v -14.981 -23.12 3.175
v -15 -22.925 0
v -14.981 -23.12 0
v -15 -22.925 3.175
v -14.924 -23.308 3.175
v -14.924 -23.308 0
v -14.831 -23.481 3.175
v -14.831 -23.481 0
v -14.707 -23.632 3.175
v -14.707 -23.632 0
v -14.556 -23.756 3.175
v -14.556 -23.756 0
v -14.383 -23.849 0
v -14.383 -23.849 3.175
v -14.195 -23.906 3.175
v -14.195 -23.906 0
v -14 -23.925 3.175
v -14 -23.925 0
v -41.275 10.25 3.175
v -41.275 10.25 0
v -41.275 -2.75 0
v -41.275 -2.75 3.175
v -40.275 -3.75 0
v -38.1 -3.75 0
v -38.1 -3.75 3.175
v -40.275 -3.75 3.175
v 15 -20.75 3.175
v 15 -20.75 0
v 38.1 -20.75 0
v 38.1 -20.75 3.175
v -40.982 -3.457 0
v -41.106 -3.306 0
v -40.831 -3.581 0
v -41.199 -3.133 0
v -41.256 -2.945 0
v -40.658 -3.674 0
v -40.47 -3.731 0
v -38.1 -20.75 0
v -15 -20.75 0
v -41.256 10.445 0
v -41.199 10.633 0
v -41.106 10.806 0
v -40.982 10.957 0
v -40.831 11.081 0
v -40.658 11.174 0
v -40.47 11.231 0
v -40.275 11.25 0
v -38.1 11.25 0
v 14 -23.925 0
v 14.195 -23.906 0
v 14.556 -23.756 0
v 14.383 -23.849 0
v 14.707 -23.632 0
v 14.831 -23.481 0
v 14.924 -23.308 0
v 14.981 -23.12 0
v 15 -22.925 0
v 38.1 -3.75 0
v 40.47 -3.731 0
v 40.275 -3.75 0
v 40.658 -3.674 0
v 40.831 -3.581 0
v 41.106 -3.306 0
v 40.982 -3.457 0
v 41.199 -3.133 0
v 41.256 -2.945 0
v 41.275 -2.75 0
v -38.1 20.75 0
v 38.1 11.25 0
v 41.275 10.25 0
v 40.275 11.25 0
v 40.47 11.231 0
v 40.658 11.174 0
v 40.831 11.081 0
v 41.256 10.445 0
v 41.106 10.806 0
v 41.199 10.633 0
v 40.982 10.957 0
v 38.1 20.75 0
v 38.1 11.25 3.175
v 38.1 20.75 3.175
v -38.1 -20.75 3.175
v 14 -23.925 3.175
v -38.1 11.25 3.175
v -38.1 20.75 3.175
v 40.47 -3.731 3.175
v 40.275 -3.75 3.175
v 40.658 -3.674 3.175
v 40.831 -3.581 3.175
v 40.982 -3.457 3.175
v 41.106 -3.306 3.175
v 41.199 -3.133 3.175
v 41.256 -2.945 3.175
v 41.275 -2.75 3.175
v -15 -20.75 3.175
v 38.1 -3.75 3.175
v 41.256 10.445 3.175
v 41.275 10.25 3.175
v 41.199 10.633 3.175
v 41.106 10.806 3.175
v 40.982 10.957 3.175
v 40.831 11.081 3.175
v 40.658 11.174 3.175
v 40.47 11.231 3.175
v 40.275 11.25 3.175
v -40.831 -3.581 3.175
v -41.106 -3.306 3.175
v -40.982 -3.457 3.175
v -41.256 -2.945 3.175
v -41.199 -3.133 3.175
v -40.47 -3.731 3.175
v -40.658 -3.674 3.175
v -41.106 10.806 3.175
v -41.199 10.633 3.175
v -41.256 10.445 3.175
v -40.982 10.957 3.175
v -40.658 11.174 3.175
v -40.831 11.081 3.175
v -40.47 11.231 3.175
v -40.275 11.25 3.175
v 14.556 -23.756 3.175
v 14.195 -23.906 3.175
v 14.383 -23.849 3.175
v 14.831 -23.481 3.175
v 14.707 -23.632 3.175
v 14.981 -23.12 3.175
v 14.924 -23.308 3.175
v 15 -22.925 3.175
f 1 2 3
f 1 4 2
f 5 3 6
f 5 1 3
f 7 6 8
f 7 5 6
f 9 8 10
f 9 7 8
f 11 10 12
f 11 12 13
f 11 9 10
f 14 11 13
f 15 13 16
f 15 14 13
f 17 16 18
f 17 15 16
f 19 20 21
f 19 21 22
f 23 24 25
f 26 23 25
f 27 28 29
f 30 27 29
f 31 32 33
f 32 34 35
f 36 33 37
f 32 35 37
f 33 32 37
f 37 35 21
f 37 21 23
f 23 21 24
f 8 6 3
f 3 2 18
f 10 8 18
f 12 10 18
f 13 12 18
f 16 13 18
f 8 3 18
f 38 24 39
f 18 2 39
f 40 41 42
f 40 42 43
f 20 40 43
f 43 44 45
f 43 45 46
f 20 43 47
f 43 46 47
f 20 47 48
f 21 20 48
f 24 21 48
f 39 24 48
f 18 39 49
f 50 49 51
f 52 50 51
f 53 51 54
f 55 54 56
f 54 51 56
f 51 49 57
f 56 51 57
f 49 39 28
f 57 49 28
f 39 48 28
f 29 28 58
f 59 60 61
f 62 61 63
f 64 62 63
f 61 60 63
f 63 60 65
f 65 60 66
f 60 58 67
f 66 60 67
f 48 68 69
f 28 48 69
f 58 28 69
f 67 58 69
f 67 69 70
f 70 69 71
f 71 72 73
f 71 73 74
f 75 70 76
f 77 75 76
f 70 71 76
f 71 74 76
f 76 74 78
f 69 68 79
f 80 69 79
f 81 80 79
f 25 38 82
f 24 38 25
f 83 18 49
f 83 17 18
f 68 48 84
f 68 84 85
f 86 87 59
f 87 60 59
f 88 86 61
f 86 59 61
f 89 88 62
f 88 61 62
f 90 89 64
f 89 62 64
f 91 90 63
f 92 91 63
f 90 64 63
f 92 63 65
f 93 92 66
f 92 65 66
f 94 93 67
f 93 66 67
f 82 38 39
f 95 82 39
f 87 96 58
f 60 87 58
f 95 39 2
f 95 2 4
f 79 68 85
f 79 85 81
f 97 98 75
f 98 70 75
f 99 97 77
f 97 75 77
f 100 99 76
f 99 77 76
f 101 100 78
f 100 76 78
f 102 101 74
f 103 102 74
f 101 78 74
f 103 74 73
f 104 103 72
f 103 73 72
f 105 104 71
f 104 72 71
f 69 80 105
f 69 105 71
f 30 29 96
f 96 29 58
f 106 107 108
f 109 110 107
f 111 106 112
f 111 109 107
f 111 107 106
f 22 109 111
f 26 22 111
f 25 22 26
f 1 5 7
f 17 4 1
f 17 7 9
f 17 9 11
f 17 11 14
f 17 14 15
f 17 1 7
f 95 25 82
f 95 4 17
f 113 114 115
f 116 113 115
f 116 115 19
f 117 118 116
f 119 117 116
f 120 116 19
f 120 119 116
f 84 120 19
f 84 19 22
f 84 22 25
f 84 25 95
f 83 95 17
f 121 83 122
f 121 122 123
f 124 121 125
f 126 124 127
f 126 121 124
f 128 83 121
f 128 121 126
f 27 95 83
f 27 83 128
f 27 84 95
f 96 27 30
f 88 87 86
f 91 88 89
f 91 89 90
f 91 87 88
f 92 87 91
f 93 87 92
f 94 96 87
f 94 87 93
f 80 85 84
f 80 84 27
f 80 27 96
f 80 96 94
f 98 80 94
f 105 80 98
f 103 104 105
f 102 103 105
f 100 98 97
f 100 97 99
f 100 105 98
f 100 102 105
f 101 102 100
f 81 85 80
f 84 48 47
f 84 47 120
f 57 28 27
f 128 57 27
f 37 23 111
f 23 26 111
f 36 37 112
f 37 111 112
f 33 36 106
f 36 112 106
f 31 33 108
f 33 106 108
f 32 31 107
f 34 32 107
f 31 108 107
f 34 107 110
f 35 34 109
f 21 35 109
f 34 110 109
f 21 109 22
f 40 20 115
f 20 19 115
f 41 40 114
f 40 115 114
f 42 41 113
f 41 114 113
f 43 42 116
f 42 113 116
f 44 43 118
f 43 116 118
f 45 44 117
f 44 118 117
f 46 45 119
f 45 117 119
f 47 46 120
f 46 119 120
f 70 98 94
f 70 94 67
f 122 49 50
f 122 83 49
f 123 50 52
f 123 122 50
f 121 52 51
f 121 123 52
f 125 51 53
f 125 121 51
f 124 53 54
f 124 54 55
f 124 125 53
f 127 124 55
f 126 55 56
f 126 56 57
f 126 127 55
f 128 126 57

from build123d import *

# Parameters (mm, degrees)
SKETCH1_W           = 76.2
SKETCH1_H           = 41.5
BOSS_EXTRUDE1_DEPTH = 3.175
SKETCH2_W           = 3.175
SKETCH2_H           = 15
BOSS_EXTRUDE2_DEPTH = 3.175
SKETCH4_W           = 30
SKETCH4_H           = 3.175
BOSS_EXTRUDE4_DEPTH = 3.175
SKETCH5_W           = 3.175
SKETCH5_H           = 15
BOSS_EXTRUDE5_DEPTH = 3.175
FILLET1_R           = 1


with BuildPart() as part:
    # Sketch1 → Boss-Extrude1 (new body)
    with BuildSketch(Plane.XY):
        Rectangle(SKETCH1_W, SKETCH1_H)
    extrude(amount=BOSS_EXTRUDE1_DEPTH)

    # Sketch2 → Boss-Extrude2 (add)
    with BuildSketch(Plane(origin=(38.1, 0, 0), x_dir=(0, 0, -1), z_dir=(1, 0, 0))):
        with Locations((-1.5875, 3.75)):
            Rectangle(SKETCH2_W, SKETCH2_H)
    extrude(amount=BOSS_EXTRUDE2_DEPTH)

    # Sketch4 → Boss-Extrude4 (add)
    with BuildSketch(Plane.XZ.offset(20.75)):
        with Locations((0, 1.5875)):
            Rectangle(SKETCH4_W, SKETCH4_H)
    extrude(amount=BOSS_EXTRUDE4_DEPTH)

    # Sketch5 → Boss-Extrude5 (add)
    with BuildSketch(Plane.ZY.offset(38.1)):
        with Locations((1.5875, 3.75)):
            Rectangle(SKETCH5_W, SKETCH5_H)
    extrude(amount=BOSS_EXTRUDE5_DEPTH)

    # Fillet1
    fillet1_edges = [part.edges().sort_by_distance(p)[0] for p in [
        (41.275, -3.75, 1.5875),
        (41.275, 11.25, 1.5875),
        (-15, -23.925, 1.5875),
        (15, -23.925, 1.5875),
        (-41.275, -3.75, 1.5875),
        (-41.275, 11.25, 1.5875),
    ]]
    fillet(fillet1_edges, radius=FILLET1_R)


solid = part.part
